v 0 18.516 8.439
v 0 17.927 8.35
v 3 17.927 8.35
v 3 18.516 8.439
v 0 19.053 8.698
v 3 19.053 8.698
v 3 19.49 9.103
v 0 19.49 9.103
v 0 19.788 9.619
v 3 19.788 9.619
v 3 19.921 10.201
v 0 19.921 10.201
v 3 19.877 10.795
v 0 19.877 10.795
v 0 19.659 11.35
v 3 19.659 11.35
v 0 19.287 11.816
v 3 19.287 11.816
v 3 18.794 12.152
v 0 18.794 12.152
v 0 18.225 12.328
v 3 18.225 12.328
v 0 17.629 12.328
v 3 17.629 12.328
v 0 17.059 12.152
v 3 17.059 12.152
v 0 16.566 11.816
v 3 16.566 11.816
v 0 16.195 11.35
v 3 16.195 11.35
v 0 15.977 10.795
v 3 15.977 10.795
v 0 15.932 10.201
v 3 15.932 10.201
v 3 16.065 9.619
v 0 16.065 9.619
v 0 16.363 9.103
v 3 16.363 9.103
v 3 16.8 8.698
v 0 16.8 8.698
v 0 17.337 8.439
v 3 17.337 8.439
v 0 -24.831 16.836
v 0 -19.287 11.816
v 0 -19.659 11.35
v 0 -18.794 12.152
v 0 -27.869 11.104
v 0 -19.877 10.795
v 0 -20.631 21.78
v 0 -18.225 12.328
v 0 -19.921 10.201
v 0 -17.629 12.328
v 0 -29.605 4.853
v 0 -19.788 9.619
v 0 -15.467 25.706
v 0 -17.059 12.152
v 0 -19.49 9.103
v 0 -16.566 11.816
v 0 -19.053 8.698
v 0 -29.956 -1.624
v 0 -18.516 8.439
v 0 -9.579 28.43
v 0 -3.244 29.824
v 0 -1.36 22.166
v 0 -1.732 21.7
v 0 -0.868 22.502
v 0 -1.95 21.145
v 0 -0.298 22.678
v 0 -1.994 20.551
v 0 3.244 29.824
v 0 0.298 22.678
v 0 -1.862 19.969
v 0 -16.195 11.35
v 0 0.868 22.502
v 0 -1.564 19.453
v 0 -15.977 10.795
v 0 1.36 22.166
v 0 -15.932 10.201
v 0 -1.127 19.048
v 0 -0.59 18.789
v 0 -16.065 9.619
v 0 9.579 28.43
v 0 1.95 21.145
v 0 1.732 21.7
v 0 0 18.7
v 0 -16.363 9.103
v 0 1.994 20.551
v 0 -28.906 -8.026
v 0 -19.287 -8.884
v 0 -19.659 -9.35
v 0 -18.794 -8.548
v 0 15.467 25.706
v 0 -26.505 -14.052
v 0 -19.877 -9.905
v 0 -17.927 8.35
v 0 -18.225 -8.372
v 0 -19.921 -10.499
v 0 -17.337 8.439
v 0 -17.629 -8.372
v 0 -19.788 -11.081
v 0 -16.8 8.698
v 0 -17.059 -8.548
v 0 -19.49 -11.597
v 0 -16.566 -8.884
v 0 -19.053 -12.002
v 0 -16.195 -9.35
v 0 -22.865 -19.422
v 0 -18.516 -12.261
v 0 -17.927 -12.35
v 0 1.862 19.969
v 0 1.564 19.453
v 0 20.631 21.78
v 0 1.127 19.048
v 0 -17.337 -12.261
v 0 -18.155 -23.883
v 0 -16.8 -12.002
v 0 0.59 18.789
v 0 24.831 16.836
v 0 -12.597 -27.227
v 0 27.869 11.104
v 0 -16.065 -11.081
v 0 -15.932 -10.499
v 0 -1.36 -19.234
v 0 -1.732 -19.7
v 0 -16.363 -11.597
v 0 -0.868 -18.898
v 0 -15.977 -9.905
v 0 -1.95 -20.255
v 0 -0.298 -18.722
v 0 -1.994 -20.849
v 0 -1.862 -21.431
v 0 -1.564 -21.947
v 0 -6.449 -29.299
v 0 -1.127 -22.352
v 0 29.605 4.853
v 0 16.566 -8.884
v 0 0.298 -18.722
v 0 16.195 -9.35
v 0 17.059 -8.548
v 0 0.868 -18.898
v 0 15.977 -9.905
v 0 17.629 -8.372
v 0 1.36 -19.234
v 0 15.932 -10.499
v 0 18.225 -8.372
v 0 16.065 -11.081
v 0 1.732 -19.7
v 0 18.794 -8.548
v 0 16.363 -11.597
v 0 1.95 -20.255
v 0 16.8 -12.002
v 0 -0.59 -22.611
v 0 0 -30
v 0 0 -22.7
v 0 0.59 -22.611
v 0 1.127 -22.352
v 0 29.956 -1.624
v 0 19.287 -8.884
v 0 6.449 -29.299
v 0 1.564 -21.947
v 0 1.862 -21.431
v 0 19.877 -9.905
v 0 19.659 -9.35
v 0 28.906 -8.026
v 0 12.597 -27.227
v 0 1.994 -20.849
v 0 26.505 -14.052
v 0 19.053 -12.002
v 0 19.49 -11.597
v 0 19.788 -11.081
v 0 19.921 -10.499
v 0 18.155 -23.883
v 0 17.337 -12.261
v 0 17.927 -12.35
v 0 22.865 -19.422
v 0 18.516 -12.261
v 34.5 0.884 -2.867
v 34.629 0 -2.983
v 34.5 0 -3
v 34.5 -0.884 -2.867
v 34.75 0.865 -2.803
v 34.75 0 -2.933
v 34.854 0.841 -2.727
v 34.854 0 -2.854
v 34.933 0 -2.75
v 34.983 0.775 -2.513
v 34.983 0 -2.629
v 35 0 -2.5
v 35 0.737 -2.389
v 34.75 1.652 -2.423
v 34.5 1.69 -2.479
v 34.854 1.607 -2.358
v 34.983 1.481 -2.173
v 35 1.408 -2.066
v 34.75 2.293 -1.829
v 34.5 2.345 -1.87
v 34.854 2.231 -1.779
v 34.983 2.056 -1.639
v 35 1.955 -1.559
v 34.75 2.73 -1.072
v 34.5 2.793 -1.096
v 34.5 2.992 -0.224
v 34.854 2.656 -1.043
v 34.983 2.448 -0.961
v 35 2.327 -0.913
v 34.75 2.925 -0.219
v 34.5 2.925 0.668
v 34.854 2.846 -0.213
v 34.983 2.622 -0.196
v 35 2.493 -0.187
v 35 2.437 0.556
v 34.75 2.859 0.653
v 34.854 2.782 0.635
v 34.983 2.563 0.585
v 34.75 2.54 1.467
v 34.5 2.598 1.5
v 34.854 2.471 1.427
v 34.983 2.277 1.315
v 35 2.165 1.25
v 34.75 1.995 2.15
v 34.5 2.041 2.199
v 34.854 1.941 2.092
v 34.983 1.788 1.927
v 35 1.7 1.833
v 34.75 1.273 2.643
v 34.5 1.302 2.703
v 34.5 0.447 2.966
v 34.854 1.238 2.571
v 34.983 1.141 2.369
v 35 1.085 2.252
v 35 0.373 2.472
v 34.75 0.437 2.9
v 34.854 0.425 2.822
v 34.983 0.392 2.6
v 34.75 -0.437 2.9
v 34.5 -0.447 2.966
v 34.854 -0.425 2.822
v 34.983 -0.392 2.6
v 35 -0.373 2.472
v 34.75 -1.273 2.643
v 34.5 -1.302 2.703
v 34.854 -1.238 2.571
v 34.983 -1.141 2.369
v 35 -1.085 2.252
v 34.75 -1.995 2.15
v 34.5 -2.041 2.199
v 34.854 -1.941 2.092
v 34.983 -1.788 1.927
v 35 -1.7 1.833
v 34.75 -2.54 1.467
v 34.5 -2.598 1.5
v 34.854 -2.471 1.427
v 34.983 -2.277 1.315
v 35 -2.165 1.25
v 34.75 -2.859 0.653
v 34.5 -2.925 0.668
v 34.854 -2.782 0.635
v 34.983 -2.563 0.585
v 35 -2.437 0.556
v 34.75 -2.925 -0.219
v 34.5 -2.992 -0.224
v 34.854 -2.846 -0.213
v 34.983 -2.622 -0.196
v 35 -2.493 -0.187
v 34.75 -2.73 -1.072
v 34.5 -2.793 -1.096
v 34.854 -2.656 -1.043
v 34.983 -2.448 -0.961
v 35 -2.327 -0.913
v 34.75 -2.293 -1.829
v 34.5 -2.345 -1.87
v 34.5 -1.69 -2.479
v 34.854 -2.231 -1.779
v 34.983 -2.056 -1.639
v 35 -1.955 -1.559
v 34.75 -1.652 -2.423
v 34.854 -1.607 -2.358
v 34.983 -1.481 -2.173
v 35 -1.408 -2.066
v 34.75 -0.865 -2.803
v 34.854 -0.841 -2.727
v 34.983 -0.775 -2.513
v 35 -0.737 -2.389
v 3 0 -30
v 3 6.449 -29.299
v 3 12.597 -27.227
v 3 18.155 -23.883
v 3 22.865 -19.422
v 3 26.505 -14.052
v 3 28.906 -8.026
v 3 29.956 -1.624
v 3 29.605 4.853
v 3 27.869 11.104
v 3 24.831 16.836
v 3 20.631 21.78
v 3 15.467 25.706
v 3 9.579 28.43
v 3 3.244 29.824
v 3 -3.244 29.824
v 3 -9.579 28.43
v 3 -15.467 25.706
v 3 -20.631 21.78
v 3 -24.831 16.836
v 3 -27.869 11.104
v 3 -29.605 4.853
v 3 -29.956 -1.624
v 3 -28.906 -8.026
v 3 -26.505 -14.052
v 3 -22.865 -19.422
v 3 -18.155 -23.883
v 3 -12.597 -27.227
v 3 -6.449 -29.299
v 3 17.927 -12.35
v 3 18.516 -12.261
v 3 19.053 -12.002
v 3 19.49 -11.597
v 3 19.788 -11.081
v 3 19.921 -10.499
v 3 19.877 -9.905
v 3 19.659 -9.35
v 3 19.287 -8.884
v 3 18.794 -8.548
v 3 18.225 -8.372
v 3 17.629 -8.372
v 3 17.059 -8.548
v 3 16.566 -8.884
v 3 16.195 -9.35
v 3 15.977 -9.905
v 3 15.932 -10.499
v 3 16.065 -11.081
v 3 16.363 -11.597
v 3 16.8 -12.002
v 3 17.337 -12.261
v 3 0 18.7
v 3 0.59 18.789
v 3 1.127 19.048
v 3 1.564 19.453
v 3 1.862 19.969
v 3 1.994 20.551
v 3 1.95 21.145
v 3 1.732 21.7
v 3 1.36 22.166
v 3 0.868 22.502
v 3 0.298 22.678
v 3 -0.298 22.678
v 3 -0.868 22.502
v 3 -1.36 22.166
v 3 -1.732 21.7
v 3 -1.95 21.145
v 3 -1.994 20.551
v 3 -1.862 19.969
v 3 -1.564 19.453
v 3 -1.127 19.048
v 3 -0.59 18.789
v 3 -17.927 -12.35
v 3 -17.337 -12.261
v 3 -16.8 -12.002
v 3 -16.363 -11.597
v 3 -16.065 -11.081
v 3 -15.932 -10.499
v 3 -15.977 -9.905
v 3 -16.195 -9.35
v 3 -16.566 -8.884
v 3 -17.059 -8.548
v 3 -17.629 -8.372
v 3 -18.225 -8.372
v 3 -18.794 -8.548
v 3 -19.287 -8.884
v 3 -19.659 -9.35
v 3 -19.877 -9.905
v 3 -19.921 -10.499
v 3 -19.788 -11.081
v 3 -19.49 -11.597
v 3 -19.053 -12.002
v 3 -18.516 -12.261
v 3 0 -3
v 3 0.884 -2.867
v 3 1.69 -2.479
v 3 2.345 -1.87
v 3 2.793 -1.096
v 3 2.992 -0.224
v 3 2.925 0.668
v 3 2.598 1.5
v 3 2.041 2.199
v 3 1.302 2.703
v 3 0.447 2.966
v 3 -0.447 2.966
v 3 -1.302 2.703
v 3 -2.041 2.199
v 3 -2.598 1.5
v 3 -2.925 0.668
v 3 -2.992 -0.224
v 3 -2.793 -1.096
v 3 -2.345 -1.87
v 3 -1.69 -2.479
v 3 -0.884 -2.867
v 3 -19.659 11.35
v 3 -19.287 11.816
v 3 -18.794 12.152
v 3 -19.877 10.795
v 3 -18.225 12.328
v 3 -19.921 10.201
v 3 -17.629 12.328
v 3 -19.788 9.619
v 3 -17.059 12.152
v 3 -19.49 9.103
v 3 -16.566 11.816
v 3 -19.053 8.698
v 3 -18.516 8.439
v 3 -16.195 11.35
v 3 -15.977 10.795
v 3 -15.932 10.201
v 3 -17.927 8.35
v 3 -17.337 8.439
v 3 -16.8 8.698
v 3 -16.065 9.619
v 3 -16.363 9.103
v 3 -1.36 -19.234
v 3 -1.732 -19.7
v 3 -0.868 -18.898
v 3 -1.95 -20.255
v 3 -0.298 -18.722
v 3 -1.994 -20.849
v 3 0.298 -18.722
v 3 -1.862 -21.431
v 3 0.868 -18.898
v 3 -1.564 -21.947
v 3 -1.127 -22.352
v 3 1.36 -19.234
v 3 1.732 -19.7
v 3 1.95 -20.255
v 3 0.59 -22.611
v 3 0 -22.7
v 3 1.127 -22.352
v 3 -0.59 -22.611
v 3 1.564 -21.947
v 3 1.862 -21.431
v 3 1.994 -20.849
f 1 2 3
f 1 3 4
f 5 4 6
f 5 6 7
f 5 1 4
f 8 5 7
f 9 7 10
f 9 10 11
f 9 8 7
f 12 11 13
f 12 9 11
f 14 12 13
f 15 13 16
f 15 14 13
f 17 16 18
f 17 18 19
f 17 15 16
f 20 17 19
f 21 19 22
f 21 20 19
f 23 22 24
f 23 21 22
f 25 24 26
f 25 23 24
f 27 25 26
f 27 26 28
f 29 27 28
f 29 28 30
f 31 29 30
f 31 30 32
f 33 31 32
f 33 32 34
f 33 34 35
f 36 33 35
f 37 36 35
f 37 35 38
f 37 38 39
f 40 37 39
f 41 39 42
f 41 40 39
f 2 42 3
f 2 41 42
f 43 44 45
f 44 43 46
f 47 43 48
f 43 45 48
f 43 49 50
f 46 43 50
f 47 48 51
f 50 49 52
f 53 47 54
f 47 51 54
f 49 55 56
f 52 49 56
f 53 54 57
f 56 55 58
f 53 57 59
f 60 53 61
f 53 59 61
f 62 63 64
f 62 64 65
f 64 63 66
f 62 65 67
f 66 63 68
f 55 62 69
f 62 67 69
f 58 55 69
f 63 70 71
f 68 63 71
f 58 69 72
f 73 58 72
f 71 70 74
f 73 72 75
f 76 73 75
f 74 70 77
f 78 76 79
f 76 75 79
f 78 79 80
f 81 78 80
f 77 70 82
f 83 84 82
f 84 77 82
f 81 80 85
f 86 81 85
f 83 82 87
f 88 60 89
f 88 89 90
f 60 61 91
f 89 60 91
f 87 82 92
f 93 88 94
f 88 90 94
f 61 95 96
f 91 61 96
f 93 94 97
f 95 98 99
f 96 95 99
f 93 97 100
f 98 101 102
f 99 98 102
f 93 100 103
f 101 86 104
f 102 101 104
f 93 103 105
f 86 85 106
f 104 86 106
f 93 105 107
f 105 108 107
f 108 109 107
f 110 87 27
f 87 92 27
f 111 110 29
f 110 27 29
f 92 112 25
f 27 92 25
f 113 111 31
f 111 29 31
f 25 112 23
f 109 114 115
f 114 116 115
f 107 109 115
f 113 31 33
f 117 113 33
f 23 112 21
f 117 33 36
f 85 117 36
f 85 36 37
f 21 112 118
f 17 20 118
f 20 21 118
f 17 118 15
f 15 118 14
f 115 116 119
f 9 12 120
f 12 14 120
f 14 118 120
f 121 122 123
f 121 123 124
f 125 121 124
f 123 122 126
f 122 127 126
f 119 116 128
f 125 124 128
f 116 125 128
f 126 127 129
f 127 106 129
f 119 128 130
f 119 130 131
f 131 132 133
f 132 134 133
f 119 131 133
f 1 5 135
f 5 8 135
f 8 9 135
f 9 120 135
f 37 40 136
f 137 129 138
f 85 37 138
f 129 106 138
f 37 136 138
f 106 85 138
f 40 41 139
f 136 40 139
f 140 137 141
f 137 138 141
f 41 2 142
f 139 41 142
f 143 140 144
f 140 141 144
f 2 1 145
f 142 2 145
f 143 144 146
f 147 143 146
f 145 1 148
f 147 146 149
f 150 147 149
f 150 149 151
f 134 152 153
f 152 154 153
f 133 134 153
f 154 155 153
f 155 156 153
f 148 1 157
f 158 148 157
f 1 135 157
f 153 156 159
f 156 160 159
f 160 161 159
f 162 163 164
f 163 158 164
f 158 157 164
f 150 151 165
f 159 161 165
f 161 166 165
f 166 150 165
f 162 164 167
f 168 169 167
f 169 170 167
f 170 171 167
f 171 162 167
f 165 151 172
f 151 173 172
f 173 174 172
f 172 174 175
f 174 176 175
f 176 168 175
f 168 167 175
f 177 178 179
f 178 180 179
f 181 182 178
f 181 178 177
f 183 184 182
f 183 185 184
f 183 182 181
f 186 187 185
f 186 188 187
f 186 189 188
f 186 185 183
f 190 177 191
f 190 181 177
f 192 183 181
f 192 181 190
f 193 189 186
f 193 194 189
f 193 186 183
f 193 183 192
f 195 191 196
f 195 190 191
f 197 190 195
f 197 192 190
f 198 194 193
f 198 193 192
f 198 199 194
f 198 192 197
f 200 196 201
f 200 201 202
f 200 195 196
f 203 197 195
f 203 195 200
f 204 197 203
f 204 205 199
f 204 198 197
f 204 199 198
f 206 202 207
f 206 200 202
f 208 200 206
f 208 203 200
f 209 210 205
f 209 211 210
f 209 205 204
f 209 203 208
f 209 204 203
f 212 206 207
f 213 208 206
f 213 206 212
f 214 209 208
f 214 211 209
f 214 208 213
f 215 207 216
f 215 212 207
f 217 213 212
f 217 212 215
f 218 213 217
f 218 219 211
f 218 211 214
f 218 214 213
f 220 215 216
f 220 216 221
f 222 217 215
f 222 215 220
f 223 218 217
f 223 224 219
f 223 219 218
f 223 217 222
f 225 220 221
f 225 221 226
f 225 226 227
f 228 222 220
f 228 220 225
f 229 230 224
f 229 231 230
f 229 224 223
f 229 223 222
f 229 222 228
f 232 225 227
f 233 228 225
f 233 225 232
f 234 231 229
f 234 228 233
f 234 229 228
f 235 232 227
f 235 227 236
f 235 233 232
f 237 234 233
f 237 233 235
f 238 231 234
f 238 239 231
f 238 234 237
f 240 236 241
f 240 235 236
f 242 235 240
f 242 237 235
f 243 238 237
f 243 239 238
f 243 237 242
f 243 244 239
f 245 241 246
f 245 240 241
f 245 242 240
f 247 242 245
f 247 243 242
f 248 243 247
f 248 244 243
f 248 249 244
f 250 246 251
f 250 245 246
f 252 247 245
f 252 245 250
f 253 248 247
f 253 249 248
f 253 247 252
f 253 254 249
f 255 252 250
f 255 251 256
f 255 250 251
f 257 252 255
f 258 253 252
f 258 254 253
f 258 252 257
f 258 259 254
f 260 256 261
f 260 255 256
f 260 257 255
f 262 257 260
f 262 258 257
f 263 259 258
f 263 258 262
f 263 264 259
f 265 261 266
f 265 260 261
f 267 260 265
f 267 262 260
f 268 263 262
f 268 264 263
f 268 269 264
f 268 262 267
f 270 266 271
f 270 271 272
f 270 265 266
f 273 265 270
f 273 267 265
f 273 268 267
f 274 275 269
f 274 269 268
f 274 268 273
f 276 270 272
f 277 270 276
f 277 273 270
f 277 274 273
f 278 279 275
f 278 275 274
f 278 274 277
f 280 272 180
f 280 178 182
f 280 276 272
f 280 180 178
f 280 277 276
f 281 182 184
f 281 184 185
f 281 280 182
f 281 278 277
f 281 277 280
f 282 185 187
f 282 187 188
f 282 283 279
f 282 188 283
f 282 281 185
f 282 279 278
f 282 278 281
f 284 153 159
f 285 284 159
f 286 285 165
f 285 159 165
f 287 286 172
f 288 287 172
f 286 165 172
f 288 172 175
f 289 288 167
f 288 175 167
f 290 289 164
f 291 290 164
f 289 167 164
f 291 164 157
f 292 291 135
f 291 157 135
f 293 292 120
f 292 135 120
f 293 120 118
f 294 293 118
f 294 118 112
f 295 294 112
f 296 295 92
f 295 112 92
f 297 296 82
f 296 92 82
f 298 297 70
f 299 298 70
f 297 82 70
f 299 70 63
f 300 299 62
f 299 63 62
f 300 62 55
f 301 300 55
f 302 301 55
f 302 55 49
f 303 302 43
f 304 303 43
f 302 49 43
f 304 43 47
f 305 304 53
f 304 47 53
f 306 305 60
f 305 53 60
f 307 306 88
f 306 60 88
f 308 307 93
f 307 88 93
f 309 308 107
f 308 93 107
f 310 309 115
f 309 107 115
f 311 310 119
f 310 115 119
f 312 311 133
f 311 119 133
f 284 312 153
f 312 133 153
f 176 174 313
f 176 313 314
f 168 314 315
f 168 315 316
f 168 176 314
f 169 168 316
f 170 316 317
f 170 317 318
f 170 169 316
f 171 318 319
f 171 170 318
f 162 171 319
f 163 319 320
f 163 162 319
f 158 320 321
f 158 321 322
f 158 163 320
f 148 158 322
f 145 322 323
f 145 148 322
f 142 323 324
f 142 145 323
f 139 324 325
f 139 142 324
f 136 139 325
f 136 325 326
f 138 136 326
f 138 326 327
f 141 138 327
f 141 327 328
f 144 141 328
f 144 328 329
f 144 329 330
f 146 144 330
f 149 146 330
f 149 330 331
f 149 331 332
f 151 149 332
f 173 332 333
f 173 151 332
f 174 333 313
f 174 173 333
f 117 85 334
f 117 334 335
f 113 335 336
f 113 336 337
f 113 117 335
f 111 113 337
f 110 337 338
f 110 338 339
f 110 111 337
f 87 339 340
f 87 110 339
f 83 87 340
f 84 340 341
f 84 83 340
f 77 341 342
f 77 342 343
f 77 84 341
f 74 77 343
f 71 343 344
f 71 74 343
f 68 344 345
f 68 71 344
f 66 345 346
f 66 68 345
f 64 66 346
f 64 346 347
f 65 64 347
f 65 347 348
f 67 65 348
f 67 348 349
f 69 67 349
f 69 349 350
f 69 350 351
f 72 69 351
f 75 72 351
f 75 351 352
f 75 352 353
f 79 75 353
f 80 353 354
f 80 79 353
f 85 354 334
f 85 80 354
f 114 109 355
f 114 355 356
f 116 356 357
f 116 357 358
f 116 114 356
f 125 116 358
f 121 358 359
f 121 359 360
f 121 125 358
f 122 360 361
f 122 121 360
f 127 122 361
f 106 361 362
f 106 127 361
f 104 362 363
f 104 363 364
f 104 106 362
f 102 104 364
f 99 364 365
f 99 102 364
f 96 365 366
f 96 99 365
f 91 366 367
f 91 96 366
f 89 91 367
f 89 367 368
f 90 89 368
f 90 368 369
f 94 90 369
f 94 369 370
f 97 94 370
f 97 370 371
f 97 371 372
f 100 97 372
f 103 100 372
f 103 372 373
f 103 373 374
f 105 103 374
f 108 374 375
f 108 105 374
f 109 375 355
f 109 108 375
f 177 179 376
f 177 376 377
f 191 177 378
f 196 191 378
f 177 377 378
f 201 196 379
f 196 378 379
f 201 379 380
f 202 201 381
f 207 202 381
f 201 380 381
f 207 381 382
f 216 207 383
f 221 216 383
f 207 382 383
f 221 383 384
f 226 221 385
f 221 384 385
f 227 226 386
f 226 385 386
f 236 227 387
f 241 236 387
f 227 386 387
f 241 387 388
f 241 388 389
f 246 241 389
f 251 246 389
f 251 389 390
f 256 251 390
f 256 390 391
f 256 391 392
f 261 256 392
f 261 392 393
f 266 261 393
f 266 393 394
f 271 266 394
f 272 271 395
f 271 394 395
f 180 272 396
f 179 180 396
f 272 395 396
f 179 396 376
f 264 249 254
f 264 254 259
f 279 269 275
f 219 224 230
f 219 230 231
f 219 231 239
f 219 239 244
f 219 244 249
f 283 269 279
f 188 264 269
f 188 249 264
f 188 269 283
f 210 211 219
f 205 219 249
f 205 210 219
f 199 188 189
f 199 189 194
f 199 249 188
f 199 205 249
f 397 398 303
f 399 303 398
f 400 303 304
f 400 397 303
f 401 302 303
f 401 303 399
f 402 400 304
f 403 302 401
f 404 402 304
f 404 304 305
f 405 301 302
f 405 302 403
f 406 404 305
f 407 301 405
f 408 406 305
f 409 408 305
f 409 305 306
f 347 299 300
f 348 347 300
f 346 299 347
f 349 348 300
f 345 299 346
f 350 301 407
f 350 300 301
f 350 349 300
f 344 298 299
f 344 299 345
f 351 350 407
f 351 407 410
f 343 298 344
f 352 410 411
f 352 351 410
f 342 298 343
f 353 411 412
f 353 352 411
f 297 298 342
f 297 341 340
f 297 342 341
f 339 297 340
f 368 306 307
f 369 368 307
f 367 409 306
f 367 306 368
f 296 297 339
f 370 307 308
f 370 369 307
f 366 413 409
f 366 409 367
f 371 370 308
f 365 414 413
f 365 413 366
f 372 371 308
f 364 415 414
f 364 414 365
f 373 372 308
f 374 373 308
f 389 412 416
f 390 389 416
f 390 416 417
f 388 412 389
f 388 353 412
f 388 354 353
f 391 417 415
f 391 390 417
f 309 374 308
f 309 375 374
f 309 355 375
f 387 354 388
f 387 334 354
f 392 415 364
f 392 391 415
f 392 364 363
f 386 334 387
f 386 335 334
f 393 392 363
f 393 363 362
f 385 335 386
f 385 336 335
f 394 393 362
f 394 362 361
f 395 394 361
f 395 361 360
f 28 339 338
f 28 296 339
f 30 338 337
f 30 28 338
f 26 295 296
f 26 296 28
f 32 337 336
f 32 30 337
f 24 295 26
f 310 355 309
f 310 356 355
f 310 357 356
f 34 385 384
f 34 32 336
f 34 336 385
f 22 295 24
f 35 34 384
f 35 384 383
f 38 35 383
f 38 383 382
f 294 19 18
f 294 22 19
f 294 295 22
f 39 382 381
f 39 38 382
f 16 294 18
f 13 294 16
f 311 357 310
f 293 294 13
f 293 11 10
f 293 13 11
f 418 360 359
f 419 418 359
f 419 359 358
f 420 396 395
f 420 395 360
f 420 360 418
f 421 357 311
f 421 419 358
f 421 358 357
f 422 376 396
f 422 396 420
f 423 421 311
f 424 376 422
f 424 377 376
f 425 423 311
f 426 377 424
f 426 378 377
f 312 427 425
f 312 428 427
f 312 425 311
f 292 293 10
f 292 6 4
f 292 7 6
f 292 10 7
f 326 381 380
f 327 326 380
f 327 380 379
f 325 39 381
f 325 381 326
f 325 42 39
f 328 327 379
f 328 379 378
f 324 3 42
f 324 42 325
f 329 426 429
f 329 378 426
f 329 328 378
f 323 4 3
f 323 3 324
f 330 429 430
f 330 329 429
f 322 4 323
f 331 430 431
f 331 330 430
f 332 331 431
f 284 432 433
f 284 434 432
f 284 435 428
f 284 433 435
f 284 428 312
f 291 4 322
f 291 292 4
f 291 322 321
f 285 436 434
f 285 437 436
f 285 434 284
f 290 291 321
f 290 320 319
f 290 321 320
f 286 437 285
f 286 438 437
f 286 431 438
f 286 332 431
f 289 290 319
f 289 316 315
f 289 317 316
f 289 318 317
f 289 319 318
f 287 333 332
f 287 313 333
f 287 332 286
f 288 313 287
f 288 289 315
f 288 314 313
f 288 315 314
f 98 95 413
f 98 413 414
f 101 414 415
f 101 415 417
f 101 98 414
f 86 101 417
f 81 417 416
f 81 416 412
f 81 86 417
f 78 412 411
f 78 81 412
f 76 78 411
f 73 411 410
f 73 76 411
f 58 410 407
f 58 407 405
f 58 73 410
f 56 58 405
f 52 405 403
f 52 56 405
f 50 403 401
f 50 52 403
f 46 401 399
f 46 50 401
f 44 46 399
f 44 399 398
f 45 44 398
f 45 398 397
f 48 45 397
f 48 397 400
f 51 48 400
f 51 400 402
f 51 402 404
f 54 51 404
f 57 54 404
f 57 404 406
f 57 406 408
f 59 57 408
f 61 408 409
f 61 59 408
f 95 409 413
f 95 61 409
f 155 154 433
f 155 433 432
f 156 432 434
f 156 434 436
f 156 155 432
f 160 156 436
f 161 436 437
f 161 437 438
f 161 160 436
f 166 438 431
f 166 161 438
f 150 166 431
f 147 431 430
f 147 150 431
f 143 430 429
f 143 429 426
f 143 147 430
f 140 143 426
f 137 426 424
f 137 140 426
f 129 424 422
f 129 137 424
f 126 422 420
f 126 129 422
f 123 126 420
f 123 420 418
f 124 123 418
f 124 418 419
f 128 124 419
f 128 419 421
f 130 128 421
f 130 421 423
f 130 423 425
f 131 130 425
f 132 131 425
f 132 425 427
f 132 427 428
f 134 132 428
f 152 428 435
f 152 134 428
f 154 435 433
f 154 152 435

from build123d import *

# Parameters (mm, degrees)
SKETCH1_R           = 30
BOSS_EXTRUDE1_DEPTH = 3
SKETCH2_R           = 2
CUT_EXTRUDE1_DEPTH  = 3
SKETCH3_R           = 3
BOSS_EXTRUDE2_DEPTH = 32
FILLET1_R           = 0.5


with BuildPart() as part:
    # Sketch1 → Boss-Extrude1 (new body)
    with BuildSketch(Plane(origin=(0, 0, 0), x_dir=(0, 0, -1), z_dir=(1, 0, 0))):
        Circle(SKETCH1_R)
    extrude(amount=BOSS_EXTRUDE1_DEPTH)

    # Sketch2 → Cut-Extrude1 (cut)
    with BuildSketch(Plane(origin=(0, 0, 0), x_dir=(0, 0, -1), z_dir=(1, 0, 0))):
        with Locations((20.7, 0)):
            Circle(SKETCH2_R)
        with Locations((10.35, -17.926725858)):
            Circle(SKETCH2_R)
        with Locations((-10.35, -17.926725858)):
            Circle(SKETCH2_R)
        with Locations((-20.7, 0)):
            Circle(SKETCH2_R)
        with Locations((-10.35, 17.926725858)):
            Circle(SKETCH2_R)
        with Locations((10.35, 17.926725858)):
            Circle(SKETCH2_R)
    extrude(amount=CUT_EXTRUDE1_DEPTH, mode=Mode.SUBTRACT)

    # Sketch3 → Boss-Extrude2 (add)
    with BuildSketch(Plane(origin=(3, 0, 0), x_dir=(0, 0, -1), z_dir=(1, 0, 0))):
        Circle(SKETCH3_R)
    extrude(amount=BOSS_EXTRUDE2_DEPTH)

    # Fillet1
    fillet1_edges = [part.edges().sort_by_distance(p)[0] for p in [
        (35, 0, 3),
    ]]
    fillet(fillet1_edges, radius=FILLET1_R)


solid = part.part
